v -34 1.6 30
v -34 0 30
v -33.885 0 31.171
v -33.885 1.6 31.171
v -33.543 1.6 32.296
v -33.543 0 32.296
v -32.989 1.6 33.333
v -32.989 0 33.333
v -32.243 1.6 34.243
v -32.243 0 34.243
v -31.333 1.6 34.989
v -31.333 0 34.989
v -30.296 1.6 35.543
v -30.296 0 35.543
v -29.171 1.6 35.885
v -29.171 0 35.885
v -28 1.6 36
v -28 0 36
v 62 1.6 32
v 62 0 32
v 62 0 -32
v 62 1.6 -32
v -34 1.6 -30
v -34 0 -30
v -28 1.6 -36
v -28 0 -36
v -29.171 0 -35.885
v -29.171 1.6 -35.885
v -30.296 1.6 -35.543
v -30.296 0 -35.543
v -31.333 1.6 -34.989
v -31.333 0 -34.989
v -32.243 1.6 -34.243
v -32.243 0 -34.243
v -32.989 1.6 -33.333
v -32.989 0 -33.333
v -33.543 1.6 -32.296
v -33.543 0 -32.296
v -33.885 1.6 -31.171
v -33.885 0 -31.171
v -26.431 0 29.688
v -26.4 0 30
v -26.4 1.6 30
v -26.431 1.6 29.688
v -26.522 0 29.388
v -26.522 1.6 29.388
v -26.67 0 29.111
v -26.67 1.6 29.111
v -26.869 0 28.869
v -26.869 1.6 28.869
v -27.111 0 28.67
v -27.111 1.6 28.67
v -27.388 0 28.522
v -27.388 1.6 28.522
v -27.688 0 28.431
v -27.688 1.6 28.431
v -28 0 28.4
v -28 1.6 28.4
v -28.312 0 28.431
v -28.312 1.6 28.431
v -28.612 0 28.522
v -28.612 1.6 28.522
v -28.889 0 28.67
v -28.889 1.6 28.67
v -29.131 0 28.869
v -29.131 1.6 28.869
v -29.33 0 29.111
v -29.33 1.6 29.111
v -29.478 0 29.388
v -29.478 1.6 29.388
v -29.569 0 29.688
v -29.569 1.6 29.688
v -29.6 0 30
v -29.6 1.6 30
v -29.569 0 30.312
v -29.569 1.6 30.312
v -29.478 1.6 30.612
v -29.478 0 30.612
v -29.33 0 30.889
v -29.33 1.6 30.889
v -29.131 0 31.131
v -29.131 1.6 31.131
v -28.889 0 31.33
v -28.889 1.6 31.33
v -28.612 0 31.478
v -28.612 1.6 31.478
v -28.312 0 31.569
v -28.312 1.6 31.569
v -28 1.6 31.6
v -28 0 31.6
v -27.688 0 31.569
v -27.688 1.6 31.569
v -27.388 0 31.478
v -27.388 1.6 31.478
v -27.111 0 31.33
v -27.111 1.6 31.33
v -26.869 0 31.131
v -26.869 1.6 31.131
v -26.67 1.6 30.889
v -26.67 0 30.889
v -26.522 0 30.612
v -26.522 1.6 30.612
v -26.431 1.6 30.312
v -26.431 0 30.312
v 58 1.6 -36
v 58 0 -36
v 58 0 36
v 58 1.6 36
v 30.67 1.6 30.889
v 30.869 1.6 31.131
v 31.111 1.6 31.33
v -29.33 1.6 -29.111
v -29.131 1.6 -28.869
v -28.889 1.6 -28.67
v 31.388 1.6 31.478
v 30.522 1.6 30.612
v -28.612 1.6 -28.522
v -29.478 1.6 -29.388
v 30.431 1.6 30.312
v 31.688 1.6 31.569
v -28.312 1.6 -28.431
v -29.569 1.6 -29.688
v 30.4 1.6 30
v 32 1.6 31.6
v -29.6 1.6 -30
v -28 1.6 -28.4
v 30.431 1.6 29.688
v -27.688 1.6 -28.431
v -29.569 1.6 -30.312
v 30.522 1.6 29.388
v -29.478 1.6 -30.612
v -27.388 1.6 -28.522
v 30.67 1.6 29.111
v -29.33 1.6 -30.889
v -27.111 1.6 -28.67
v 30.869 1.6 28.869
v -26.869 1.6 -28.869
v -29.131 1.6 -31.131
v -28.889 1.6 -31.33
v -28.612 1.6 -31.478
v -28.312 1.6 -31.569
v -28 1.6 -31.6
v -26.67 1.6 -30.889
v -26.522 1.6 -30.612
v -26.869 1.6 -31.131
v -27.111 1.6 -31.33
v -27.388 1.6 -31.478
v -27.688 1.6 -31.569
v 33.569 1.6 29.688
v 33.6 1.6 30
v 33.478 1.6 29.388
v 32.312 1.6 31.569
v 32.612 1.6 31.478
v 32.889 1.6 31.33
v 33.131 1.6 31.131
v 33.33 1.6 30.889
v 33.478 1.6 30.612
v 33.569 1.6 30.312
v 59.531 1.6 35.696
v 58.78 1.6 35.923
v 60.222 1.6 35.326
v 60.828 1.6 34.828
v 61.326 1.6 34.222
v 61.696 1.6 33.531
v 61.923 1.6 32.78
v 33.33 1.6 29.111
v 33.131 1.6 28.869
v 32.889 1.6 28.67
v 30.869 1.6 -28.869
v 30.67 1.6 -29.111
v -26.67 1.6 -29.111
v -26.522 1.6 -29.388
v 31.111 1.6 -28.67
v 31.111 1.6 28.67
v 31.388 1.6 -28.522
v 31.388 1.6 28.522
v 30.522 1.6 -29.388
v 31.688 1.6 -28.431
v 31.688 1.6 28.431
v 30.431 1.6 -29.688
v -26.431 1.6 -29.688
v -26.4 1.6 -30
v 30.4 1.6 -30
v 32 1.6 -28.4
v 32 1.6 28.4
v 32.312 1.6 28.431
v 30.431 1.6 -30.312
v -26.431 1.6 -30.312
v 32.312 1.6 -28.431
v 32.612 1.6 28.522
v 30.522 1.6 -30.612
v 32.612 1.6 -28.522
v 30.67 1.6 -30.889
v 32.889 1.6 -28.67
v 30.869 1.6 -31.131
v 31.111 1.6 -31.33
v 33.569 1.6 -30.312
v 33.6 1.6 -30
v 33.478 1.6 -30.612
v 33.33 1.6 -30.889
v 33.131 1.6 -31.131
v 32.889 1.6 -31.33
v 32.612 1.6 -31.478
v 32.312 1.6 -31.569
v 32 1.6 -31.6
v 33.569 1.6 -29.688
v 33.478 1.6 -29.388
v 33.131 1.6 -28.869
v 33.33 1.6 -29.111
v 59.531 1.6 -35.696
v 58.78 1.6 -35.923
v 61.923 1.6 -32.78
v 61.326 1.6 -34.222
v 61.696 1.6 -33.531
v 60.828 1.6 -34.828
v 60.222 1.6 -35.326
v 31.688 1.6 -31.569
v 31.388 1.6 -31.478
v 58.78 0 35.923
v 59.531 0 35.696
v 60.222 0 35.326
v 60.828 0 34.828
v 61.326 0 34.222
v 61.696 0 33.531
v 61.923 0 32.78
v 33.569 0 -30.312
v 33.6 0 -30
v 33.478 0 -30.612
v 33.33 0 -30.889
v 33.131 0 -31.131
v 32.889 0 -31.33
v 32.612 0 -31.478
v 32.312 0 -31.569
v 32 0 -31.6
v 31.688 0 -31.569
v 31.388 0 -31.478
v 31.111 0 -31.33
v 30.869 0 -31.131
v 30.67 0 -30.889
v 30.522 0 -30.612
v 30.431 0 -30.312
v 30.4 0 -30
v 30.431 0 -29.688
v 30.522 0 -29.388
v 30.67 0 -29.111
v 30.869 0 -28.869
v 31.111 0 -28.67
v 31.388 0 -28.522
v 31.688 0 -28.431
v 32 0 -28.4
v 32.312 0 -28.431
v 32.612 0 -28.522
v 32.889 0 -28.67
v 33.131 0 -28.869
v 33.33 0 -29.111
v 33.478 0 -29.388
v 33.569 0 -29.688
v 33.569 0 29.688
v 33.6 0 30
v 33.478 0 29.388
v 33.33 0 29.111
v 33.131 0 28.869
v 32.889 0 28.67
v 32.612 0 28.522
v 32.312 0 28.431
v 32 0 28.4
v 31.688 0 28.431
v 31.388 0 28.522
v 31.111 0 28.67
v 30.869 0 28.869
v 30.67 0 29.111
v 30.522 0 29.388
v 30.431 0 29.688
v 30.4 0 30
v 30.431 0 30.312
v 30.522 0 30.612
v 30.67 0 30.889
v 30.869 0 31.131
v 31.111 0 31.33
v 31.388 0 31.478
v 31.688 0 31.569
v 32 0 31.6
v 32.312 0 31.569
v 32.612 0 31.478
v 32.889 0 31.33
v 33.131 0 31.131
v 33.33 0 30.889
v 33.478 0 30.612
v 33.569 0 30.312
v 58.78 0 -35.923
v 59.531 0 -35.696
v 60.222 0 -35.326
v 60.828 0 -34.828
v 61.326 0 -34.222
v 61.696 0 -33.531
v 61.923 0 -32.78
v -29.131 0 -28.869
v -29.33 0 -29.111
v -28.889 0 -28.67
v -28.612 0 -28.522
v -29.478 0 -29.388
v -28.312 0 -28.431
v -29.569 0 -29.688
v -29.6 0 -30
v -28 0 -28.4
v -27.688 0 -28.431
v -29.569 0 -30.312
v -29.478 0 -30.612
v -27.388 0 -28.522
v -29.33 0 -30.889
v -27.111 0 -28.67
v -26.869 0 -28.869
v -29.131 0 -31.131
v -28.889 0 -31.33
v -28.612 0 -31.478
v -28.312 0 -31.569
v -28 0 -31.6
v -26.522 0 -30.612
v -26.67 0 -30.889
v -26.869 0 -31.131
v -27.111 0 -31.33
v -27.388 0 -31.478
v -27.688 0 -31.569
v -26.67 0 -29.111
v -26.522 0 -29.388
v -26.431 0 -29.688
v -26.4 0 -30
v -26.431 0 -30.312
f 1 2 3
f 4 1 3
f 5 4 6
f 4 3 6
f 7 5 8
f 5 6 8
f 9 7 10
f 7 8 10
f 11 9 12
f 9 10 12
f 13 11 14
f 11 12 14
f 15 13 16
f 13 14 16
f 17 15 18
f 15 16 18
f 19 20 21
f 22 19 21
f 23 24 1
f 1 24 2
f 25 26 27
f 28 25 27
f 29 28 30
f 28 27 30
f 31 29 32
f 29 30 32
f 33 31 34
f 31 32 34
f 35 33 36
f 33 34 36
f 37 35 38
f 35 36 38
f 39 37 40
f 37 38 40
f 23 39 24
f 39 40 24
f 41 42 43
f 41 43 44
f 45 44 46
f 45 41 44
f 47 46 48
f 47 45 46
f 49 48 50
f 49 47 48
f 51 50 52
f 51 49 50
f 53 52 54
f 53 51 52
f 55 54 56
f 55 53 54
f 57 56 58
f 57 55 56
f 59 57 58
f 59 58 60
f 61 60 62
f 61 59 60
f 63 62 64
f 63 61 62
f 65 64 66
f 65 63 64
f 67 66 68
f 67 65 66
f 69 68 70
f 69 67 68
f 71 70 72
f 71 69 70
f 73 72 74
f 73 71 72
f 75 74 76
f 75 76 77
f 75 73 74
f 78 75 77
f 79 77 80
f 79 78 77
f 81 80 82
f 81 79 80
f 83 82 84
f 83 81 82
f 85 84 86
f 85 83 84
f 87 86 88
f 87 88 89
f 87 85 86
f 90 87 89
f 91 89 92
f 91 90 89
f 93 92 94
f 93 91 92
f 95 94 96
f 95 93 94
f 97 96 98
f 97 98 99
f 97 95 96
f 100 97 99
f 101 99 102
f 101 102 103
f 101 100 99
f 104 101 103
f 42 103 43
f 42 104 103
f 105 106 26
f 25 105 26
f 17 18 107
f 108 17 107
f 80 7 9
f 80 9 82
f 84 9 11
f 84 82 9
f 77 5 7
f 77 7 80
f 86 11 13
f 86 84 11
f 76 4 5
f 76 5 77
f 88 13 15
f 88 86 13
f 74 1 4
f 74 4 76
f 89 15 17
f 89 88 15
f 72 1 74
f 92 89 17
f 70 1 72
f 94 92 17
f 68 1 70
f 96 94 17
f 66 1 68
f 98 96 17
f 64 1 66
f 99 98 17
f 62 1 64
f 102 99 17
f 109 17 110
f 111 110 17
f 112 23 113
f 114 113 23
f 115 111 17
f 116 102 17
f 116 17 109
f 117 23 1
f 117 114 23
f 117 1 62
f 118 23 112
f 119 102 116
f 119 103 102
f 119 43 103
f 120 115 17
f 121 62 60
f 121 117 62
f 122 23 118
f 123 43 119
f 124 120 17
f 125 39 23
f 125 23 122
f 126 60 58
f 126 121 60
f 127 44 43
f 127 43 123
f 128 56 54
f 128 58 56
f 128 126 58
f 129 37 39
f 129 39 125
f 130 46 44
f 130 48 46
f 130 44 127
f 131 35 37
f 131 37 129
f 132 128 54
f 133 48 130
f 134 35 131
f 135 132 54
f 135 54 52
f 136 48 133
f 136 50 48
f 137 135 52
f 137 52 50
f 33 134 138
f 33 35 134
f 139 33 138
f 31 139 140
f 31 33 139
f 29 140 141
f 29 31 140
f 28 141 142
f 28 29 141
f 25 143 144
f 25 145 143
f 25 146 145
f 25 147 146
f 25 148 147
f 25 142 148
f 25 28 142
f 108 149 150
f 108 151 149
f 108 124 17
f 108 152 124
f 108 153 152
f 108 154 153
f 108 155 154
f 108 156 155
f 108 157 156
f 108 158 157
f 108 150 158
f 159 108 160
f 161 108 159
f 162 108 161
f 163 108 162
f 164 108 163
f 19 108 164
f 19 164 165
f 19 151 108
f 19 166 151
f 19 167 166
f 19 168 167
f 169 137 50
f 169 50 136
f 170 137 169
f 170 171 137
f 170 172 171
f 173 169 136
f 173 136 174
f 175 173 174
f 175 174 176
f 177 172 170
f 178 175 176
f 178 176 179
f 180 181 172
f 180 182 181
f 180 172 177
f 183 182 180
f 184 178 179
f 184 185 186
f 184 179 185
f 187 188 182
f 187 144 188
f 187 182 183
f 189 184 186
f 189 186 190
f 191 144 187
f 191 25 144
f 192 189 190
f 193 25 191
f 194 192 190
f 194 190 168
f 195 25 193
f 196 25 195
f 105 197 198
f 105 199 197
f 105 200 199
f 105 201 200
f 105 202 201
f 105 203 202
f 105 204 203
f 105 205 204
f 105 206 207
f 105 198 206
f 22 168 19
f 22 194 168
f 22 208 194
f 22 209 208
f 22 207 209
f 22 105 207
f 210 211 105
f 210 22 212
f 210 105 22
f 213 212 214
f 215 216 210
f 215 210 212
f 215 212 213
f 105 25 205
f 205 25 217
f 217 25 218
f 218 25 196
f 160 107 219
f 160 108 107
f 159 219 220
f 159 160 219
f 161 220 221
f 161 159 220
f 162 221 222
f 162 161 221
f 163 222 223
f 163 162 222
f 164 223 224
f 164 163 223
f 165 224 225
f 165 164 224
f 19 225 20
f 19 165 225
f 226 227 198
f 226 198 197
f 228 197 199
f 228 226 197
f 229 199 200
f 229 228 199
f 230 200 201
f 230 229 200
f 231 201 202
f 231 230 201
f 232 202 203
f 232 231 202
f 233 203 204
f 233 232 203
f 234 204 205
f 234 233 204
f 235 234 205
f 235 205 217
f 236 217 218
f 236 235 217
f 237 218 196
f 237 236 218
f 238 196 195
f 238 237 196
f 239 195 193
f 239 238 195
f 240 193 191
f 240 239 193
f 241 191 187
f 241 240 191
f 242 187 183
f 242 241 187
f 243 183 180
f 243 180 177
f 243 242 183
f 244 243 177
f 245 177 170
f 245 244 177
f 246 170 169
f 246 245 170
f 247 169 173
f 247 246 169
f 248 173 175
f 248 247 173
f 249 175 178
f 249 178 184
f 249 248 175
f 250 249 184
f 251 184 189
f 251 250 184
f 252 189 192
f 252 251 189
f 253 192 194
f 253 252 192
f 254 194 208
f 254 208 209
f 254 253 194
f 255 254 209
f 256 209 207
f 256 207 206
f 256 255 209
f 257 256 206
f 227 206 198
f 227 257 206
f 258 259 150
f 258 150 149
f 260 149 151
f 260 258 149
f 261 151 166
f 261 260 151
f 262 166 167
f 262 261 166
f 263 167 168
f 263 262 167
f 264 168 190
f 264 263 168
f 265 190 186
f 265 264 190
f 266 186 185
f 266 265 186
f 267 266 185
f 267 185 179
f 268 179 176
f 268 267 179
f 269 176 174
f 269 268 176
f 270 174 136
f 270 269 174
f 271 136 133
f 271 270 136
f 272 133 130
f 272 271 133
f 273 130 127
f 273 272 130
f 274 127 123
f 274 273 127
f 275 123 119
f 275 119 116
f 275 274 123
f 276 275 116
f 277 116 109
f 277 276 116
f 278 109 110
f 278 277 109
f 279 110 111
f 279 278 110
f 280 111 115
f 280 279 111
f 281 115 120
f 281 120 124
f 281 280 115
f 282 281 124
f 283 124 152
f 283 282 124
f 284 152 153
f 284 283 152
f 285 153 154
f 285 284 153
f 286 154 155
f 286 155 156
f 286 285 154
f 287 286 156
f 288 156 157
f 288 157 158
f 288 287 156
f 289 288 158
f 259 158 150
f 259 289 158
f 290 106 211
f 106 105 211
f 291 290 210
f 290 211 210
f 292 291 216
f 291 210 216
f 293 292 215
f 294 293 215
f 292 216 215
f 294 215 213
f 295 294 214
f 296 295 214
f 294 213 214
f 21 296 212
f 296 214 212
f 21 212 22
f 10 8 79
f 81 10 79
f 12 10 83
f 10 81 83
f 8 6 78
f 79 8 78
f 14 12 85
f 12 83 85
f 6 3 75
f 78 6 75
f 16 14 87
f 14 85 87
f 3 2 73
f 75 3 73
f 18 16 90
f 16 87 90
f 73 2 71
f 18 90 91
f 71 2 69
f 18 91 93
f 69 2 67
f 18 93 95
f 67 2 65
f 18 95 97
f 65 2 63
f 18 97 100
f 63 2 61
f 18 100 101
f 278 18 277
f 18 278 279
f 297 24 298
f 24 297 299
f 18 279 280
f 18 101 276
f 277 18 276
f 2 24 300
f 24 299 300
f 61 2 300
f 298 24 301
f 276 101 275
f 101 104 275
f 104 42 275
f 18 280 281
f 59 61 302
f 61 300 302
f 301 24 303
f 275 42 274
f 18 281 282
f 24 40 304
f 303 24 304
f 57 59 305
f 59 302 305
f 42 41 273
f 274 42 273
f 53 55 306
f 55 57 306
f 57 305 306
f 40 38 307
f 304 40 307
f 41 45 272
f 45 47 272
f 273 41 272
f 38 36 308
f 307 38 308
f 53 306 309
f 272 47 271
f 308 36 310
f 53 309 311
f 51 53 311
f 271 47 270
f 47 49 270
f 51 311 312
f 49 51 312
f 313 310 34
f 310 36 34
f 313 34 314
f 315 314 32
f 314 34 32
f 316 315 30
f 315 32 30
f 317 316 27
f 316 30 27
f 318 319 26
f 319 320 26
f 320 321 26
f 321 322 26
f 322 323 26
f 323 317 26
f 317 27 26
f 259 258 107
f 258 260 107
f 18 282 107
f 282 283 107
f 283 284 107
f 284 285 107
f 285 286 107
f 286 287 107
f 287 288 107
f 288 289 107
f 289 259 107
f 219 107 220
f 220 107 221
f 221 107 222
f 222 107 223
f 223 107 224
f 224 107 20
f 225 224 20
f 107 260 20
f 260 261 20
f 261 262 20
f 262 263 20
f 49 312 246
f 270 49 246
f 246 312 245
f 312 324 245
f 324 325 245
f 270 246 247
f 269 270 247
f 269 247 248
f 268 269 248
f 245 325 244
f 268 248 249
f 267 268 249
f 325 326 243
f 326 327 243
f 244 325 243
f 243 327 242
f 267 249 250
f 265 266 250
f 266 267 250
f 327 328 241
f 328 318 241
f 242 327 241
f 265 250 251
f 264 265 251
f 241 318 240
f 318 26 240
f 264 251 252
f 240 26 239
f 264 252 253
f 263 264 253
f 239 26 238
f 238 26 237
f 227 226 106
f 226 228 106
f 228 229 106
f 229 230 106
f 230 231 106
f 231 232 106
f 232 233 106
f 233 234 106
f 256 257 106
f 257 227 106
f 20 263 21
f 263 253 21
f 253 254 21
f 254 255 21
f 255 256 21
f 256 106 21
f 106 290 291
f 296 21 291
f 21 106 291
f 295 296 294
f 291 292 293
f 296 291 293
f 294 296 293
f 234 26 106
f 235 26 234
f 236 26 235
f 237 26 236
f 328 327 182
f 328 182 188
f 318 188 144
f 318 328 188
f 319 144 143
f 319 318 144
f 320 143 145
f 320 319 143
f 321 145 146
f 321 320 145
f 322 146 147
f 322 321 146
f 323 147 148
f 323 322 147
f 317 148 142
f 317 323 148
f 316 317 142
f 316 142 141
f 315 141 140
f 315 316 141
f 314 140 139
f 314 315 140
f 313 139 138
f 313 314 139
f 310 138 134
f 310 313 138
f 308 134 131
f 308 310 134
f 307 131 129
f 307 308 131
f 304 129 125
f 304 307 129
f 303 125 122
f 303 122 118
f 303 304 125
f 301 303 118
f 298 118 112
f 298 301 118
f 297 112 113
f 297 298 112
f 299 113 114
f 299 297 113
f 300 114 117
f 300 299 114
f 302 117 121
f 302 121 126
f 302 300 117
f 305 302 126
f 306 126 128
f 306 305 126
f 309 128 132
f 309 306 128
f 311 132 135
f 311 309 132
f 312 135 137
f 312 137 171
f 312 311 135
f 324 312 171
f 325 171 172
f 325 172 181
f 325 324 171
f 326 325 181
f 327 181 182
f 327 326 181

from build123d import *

# Parameters (mm, degrees)
SKETCH1_R           = 1.6
BOSS_EXTRUDE1_DEPTH = 1.6
FILLET1_R           = 4


with BuildPart() as part:
    # Sketch1 → Boss-Extrude1 (new body)
    with BuildSketch(Plane(origin=(0, 0, 0), x_dir=(1, 0, 0), z_dir=(0, 1, 0))):
        with BuildLine():
            Line((-34, 30), (-34, -30))
            ThreePointArc((-34, -30), (-32.242640687, -34.242640687), (-28, -36))
            Line((-28, -36), (62, -36))
            Line((62, -36), (62, 36))
            Line((62, 36), (-28, 36))
            ThreePointArc((-28, 36), (-32.242640687, 34.242640687), (-34, 30))
        make_face()
        with Locations((-28, 30)):
            Circle(SKETCH1_R, mode=Mode.SUBTRACT)
        with Locations((32, 30)):
            Circle(SKETCH1_R, mode=Mode.SUBTRACT)
        with Locations((32, -30)):
            Circle(SKETCH1_R, mode=Mode.SUBTRACT)
        with Locations((-28, -30)):
            Circle(SKETCH1_R, mode=Mode.SUBTRACT)
    extrude(amount=BOSS_EXTRUDE1_DEPTH)

    # Fillet1
    fillet1_edges = [part.edges().sort_by_distance(p)[0] for p in [
        (62, 0.8, -36),
        (62, 0.8, 36),
    ]]
    fillet(fillet1_edges, radius=FILLET1_R)


solid = part.part
